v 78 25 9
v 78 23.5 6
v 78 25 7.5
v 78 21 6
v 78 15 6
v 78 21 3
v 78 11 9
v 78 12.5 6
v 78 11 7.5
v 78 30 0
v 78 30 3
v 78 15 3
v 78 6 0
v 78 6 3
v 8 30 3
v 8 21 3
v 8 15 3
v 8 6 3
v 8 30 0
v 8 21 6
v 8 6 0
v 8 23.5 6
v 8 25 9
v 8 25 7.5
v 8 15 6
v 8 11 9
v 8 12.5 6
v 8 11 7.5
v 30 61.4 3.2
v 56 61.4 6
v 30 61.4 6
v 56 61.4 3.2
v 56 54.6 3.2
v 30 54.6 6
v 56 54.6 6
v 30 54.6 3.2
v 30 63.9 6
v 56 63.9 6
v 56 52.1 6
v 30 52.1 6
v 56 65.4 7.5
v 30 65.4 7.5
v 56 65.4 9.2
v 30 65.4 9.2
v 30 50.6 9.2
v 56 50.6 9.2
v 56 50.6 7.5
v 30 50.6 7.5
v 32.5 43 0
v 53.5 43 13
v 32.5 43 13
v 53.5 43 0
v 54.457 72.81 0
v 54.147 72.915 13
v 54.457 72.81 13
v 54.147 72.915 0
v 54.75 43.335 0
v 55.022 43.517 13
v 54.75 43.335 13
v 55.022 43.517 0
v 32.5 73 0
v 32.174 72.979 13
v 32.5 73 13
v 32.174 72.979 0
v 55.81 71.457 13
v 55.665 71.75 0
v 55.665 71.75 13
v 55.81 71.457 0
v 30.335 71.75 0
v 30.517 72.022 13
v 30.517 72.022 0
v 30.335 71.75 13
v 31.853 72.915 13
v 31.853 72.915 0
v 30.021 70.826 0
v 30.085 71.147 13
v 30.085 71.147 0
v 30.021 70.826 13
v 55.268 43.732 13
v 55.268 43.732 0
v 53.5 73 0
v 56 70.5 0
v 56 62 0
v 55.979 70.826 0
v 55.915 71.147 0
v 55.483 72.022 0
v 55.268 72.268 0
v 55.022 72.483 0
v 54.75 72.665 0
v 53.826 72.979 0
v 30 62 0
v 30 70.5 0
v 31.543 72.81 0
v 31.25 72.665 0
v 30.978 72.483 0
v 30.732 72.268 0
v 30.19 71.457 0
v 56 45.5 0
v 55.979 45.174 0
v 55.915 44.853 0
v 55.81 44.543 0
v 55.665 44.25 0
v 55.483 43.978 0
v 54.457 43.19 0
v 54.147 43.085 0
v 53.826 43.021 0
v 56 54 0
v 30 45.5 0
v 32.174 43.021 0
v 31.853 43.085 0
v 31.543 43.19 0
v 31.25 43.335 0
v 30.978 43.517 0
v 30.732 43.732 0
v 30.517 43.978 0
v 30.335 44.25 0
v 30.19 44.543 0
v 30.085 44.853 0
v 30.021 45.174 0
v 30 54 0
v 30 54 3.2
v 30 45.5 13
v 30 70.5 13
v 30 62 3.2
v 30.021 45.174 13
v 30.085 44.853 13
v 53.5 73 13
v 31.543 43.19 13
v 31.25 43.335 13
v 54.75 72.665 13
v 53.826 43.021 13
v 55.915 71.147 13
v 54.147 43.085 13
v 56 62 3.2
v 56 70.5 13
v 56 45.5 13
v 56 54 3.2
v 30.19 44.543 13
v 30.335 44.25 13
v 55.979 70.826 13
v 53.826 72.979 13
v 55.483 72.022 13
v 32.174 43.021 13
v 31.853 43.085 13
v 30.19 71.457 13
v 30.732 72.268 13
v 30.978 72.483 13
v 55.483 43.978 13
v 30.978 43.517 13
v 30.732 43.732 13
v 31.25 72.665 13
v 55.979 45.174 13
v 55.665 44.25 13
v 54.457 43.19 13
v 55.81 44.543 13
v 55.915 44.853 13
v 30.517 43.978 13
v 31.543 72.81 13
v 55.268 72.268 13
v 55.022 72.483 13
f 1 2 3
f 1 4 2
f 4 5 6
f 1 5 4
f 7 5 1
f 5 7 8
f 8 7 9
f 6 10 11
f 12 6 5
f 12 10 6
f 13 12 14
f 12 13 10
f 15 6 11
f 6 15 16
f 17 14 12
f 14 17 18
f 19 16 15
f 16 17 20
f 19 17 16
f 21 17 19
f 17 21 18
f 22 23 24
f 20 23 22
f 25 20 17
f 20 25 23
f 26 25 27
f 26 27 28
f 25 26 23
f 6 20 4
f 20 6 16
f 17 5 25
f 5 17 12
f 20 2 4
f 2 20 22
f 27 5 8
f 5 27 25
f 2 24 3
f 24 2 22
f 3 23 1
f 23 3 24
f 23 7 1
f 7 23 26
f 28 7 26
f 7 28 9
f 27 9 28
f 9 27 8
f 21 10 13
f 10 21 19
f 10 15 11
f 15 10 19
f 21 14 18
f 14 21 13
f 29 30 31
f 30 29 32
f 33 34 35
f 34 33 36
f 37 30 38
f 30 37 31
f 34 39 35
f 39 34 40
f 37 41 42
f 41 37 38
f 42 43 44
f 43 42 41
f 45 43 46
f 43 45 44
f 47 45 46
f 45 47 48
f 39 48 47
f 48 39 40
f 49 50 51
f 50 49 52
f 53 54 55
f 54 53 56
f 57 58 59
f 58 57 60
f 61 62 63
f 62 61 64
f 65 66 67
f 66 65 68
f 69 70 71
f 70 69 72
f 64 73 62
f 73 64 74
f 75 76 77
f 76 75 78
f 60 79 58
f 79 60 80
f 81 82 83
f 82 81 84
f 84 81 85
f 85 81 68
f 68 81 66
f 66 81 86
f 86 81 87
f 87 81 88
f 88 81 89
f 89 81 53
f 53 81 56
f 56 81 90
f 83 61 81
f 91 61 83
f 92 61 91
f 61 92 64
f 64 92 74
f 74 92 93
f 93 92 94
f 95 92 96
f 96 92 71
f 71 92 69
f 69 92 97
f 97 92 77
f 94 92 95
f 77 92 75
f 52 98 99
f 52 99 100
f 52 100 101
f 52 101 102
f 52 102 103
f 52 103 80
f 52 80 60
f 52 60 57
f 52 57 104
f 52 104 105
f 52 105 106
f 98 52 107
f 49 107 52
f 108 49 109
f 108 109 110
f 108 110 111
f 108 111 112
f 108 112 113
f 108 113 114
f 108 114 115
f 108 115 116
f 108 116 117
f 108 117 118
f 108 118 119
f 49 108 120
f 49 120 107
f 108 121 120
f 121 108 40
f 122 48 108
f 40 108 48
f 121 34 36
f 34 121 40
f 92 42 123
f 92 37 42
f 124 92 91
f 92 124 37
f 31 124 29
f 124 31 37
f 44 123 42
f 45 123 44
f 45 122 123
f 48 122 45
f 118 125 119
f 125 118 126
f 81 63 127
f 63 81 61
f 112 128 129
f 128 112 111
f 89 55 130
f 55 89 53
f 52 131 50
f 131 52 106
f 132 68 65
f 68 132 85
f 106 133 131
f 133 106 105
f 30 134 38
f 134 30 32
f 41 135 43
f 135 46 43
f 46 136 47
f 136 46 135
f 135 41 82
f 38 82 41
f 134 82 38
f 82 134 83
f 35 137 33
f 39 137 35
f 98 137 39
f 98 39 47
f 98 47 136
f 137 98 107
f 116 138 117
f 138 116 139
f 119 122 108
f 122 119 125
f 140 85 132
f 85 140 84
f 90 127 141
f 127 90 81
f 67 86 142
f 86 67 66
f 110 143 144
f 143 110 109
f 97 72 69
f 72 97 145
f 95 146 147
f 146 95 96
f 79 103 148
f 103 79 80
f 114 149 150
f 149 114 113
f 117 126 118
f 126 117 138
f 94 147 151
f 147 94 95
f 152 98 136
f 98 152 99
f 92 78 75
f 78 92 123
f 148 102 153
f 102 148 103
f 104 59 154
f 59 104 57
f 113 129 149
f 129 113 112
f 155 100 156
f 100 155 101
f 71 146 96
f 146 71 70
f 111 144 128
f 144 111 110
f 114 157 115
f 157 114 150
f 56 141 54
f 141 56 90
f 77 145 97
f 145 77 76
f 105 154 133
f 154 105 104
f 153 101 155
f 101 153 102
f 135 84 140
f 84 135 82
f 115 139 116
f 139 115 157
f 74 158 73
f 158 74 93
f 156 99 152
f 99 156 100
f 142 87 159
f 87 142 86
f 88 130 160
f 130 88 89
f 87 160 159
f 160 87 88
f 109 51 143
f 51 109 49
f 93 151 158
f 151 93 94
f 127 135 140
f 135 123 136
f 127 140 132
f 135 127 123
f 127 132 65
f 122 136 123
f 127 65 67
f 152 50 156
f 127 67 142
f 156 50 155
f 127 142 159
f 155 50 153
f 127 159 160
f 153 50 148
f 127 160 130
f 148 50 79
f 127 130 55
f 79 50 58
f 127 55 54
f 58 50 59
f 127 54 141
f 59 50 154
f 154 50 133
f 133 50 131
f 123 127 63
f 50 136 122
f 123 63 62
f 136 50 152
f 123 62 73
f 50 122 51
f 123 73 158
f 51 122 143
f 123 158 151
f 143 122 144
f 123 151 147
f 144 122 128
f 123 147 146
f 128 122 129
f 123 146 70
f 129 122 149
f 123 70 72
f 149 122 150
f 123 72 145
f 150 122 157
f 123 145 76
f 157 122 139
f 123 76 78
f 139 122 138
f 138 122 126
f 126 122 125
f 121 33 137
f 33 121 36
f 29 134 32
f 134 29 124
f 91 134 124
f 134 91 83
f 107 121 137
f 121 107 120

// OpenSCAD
/*
Sample 091: Pilzkopf-/T-Linearführung — 0,40 mm
Generated from the FDM Mechanical Sample Library.
Units: millimetres.

Override examples:
  openscad -o custom.stl -D 'view="plate"' -D 'render_fn=64' model.scad
  openscad -o preview.png -D 'view="assembly"' model.scad
*/
use <../../../library/fdm_mechanisms.scad>

render_fn = is_undef(render_fn) ? 48 : render_fn;
view = is_undef(view) ? "plate" : view;
$fn = render_fn;

sample_t_rail(
    view=view,
    clearance=0.4,
    length=70,
    carriage_l=26
);
